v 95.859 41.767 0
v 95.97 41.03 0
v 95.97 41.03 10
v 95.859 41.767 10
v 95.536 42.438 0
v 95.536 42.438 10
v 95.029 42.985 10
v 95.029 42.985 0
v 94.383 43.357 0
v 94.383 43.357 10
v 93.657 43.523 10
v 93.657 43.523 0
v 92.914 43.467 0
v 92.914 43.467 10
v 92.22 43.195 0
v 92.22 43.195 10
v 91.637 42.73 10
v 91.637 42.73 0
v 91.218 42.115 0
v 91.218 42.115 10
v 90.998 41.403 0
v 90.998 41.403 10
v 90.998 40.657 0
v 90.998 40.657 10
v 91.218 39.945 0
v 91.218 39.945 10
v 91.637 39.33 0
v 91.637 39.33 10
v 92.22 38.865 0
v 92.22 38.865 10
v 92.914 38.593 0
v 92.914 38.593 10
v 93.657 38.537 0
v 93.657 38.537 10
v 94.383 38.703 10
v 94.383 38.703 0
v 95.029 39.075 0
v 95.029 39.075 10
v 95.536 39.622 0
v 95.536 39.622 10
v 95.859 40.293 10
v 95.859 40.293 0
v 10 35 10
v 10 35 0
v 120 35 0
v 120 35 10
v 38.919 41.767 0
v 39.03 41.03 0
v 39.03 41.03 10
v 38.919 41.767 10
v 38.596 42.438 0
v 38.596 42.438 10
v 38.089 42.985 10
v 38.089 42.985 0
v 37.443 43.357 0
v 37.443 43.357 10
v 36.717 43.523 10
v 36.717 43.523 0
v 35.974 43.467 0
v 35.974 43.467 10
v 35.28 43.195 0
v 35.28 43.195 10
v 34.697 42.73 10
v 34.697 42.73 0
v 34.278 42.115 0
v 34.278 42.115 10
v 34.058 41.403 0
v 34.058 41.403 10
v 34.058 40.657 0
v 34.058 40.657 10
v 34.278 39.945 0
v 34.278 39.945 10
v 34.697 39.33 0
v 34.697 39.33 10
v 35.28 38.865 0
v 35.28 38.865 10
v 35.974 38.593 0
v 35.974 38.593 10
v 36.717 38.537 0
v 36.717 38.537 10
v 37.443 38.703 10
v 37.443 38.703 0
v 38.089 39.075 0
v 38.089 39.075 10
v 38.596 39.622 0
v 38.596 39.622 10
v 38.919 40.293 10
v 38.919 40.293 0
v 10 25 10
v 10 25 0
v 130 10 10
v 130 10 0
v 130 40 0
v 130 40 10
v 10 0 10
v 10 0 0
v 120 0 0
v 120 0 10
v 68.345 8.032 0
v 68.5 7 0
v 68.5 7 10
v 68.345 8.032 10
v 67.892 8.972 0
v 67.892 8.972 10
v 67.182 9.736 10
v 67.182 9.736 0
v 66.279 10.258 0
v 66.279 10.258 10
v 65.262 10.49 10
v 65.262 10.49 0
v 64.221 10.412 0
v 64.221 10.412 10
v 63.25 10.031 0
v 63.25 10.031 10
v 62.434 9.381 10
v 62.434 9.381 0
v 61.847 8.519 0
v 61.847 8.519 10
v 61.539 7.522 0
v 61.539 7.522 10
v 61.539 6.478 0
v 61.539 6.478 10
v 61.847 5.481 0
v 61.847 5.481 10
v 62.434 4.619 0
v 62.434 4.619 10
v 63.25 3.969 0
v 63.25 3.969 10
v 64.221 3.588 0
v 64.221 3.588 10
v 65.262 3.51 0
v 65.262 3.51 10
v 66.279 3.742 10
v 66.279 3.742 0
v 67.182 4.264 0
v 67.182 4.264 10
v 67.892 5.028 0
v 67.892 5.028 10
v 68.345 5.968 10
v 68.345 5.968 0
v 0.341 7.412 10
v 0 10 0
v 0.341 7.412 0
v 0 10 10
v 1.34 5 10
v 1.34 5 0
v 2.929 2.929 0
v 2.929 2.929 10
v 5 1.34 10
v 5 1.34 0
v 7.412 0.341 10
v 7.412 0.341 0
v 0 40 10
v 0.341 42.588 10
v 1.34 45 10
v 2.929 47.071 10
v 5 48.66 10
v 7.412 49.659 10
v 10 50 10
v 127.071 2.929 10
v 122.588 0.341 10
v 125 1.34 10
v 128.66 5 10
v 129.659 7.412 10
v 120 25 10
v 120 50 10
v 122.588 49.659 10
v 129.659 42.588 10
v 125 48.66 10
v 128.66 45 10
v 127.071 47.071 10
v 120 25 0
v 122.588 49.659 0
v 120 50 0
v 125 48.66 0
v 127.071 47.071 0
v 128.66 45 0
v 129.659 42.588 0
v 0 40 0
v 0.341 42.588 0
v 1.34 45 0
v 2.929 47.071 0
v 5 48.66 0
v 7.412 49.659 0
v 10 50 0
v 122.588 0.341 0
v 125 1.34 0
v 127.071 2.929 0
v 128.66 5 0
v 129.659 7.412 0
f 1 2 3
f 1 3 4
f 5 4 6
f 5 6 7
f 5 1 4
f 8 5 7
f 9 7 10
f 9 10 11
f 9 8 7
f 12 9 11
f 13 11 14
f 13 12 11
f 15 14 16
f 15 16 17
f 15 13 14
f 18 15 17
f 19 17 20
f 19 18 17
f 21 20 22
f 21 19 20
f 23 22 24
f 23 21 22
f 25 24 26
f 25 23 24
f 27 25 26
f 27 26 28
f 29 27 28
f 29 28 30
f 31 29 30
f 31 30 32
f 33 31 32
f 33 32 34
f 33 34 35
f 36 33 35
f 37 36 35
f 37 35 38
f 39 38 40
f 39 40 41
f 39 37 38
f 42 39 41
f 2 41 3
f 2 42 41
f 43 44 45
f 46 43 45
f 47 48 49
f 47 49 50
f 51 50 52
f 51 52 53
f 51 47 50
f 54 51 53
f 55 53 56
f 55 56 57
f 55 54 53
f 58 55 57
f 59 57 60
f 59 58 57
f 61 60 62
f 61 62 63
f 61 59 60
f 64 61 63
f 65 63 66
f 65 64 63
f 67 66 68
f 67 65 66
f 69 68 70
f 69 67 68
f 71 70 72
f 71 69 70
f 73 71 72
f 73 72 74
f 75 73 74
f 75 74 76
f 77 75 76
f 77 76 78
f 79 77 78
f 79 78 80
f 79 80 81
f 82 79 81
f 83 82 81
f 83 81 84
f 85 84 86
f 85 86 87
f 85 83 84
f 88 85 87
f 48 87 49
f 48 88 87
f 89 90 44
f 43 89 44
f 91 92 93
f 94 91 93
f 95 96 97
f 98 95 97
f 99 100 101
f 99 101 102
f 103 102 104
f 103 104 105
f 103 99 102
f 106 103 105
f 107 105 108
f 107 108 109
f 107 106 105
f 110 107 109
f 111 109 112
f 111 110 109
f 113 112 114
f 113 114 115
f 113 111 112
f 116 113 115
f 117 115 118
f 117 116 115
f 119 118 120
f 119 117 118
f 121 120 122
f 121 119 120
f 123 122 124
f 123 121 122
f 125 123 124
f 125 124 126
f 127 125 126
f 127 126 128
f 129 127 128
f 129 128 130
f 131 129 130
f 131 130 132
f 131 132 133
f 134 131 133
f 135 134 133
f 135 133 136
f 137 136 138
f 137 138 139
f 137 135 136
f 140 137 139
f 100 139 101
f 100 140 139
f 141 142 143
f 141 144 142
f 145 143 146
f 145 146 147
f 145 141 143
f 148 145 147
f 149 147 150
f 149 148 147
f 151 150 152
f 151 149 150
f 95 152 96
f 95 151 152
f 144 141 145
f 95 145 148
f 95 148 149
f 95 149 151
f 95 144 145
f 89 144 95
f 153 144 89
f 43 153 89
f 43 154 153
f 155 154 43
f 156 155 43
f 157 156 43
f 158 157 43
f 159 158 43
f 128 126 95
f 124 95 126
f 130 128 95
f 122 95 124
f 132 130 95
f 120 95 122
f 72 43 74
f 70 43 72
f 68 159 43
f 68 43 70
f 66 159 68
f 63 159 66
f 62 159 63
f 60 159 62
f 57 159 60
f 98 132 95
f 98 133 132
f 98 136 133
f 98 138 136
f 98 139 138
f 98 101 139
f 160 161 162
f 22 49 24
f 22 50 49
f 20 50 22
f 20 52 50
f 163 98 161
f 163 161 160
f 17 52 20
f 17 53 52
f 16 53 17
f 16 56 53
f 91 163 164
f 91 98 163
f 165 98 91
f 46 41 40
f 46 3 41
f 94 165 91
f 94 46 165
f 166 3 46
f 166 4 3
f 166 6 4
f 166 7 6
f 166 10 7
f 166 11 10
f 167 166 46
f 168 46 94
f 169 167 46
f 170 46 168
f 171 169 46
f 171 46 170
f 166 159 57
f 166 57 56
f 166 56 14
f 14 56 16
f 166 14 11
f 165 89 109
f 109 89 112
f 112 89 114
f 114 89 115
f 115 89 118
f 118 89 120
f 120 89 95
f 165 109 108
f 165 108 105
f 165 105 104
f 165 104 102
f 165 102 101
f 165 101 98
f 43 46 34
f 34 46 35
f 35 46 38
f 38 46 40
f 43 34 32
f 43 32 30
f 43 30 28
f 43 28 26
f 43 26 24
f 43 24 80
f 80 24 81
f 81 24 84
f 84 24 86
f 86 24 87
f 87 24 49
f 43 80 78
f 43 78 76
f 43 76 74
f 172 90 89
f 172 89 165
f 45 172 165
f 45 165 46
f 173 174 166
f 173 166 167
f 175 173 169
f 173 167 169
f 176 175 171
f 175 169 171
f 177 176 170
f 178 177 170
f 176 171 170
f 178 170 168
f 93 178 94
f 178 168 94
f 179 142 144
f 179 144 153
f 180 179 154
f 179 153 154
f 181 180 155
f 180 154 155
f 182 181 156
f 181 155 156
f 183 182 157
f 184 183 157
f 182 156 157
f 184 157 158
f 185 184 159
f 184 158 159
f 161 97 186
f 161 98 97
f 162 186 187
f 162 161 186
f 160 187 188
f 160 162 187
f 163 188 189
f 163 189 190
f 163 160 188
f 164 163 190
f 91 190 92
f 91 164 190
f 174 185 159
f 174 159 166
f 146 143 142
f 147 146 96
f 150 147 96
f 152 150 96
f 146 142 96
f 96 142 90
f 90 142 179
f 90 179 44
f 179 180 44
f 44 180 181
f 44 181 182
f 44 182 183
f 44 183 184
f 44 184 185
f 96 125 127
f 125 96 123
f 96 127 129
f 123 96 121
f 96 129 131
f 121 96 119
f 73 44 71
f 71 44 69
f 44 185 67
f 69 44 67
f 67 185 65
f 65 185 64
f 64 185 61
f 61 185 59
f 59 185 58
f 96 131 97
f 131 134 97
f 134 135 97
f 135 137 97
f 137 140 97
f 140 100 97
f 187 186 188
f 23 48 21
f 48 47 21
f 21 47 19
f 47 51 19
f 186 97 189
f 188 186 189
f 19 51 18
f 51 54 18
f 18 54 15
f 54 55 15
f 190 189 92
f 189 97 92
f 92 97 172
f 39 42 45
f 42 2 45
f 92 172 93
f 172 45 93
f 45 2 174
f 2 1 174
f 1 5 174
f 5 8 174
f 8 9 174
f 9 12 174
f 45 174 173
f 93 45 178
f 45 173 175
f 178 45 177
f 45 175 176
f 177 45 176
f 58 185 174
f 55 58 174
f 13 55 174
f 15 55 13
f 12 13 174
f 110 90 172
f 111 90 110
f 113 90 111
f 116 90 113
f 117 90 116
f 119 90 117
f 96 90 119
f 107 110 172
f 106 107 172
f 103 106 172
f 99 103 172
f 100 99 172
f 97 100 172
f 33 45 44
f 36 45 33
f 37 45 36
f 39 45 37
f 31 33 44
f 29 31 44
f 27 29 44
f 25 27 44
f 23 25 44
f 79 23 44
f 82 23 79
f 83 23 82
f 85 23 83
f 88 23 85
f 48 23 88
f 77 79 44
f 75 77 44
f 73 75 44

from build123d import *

# Parameters (mm, degrees)
SKETCH1_W           = 130
SKETCH1_H           = 50
SKETCH1_R           = 2.5
SKETCH1_R_2         = 3.5
SKETCH1_W_2         = 110
SKETCH1_H_2         = 10
BOSS_EXTRUDE2_DEPTH = 10
FILLET1_R           = 10


with BuildPart() as part:
    # Sketch1 → Boss-Extrude2 (new body)
    with BuildSketch(Plane.XY):
        with Locations((65, 25)):
            Rectangle(SKETCH1_W, SKETCH1_H)
        with Locations((36.53, 41.03)):
            Circle(SKETCH1_R, mode=Mode.SUBTRACT)
        with Locations((93.47, 41.03)):
            Circle(SKETCH1_R, mode=Mode.SUBTRACT)
        with Locations((65, 7)):
            Circle(SKETCH1_R_2, mode=Mode.SUBTRACT)
        with Locations((65, 30)):
            Rectangle(SKETCH1_W_2, SKETCH1_H_2, mode=Mode.SUBTRACT)
    extrude(amount=BOSS_EXTRUDE2_DEPTH)

    # Fillet1
    fillet1_edges = [part.edges().sort_by_distance(p)[0] for p in [
        (0, 50, 5),
        (130, 50, 5),
        (130, 0, 5),
        (0, 0, 5),
    ]]
    fillet(fillet1_edges, radius=FILLET1_R)


solid = part.part
